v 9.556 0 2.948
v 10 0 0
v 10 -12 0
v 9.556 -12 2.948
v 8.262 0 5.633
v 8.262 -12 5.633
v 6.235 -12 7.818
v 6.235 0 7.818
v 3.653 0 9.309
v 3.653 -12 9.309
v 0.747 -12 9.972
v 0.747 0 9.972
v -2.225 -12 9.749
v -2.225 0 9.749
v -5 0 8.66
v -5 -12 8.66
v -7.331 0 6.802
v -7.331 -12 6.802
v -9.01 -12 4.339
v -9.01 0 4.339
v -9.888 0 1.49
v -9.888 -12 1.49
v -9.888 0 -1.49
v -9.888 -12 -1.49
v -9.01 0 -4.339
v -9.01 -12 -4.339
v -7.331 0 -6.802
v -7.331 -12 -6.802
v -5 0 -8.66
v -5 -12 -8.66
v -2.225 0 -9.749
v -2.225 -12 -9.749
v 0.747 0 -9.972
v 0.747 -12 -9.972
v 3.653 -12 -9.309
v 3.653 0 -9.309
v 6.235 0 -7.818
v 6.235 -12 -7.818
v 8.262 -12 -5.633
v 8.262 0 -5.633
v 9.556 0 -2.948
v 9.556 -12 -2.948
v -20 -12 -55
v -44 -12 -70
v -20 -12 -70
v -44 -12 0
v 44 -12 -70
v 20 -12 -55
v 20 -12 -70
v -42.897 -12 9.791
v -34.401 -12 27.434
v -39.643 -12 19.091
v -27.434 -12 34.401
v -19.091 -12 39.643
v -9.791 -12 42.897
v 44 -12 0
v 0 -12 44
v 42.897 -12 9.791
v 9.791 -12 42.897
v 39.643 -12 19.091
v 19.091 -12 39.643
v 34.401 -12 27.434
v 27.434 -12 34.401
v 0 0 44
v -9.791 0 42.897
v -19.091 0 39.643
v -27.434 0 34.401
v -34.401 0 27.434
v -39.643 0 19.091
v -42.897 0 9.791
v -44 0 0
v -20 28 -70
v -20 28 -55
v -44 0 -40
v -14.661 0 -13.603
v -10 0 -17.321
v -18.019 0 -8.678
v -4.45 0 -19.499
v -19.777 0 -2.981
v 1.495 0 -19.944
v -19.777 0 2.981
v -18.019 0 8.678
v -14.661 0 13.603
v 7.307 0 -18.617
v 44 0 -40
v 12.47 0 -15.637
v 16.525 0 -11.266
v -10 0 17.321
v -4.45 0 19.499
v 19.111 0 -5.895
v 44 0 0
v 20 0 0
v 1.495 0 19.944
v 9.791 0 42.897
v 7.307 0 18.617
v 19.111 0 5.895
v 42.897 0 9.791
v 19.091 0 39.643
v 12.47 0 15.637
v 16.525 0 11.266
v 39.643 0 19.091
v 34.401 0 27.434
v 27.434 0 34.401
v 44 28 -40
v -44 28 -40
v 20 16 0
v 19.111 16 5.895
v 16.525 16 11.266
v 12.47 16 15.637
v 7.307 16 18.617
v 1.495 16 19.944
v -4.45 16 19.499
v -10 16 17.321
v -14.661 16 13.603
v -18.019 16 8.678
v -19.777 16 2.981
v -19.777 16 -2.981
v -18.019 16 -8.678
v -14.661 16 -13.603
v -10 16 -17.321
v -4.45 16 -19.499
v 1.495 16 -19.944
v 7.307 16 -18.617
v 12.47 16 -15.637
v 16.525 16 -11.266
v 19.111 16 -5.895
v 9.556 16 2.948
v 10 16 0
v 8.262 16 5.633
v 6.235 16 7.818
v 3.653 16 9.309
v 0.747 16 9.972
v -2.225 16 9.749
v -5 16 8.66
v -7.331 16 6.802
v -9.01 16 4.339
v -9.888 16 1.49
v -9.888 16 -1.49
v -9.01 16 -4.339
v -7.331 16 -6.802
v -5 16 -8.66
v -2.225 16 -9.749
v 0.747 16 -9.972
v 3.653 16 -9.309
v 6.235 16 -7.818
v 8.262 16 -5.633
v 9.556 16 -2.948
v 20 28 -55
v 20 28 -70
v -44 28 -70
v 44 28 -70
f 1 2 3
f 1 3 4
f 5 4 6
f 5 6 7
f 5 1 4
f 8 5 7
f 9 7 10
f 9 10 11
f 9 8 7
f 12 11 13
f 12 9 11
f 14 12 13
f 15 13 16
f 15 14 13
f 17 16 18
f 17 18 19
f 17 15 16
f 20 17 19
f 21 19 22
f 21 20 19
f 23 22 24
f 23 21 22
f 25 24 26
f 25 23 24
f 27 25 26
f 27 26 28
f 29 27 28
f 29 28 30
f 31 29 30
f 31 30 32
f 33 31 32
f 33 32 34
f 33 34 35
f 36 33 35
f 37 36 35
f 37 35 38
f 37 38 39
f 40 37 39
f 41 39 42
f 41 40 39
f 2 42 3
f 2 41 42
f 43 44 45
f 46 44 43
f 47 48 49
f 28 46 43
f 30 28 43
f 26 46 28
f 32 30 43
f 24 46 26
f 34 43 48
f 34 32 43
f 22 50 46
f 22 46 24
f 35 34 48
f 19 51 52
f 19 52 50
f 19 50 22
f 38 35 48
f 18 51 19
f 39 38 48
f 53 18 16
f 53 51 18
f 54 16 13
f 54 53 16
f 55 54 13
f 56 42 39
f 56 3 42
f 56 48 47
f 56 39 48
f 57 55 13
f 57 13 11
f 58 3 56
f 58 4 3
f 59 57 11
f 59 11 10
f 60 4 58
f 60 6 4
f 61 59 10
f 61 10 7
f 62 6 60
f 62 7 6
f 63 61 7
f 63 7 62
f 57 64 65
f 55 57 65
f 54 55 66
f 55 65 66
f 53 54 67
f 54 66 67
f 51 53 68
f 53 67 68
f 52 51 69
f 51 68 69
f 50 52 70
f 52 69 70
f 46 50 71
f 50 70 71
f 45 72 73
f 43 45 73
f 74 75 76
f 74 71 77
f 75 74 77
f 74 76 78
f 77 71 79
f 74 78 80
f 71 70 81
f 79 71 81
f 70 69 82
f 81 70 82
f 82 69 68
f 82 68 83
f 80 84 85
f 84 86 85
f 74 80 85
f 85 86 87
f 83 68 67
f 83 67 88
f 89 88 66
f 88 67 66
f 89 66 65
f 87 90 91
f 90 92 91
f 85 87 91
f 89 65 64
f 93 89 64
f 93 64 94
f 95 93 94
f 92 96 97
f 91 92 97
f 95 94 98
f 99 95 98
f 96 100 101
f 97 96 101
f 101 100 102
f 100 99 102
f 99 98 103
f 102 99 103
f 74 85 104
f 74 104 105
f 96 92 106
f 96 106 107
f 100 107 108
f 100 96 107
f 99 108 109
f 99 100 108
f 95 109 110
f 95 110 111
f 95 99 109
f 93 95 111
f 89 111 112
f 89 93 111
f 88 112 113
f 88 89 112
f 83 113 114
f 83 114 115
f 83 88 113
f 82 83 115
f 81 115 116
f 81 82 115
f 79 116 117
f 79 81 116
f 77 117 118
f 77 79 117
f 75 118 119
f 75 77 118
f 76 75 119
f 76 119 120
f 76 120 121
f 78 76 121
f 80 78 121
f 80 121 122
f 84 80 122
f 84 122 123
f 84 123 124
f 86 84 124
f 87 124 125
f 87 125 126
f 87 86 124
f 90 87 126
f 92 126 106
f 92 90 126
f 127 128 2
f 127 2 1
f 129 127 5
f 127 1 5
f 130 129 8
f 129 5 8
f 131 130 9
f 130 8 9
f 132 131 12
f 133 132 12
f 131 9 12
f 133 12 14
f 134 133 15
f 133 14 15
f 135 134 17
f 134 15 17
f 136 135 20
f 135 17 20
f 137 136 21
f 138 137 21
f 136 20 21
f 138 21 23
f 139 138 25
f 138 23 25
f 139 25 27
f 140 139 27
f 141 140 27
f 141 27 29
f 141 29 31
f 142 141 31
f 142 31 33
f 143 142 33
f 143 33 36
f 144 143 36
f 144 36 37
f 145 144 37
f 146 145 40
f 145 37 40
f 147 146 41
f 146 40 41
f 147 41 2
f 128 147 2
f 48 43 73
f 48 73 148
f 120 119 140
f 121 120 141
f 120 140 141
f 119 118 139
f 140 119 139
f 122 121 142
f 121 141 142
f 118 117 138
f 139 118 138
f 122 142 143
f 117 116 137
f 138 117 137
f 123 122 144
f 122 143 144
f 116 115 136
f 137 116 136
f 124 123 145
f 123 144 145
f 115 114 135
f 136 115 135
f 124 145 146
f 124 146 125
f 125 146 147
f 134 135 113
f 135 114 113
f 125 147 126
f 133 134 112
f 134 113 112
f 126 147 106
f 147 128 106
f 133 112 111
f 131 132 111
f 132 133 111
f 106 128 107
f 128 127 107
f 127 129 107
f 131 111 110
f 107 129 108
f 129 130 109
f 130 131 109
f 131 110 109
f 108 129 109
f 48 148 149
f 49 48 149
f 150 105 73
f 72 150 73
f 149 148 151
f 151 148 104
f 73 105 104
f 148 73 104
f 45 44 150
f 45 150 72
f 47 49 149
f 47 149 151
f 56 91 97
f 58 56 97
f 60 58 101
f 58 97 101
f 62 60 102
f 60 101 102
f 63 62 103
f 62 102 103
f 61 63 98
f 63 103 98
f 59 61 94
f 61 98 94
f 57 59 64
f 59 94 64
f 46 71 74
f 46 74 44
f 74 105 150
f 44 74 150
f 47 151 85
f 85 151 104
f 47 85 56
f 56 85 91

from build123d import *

# Parameters (mm, degrees)
F1_DEPTH      = 12
F1_DEPTH_BACK = 28
F0_R          = 20
F2_DEPTH      = 12
F0_R_2        = 10
F3_DEPTH      = 12
F3_DEPTH_BACK = 16


with BuildPart() as f1:
    # F0 (on Front) → F1 (new body, two sides)
    with BuildSketch(Plane.XZ) as f1_sk:
        Polygon((44, -40), (-44, -40), (-44, -70), (-20, -70), (-20, -55), (20, -55), (20, -70), (44, -70), align=None)
    extrude(amount=F1_DEPTH)
    extrude(f1_sk.sketch, amount=-F1_DEPTH_BACK)

    # F0 (on Front) → F2 (join)
    with BuildSketch(Plane.XZ):
        with BuildLine():
            Line((-44, 0), (-44, -40))
            Line((-44, -40), (44, -40))
            Line((44, -40), (44, 0))
            ThreePointArc((44, 0), (31.112698, 31.112698), (0, 44))
            ThreePointArc((0, 44), (-31.112698, 31.112698), (-44, 0))
        make_face()
        Circle(F0_R, mode=Mode.SUBTRACT)
        Polygon((44, -40), (-44, -40), (-44, -70), (-20, -70), (-20, -55), (20, -55), (20, -70), (44, -70), align=None)
    extrude(amount=F2_DEPTH)

    # F0 (on Front) → F3 (join, two sides)
    with BuildSketch(Plane.XZ) as f3_sk:
        Circle(F0_R)
        Circle(F0_R_2, mode=Mode.SUBTRACT)
    extrude(amount=F3_DEPTH)
    extrude(f3_sk.sketch, amount=-F3_DEPTH_BACK)


solid = f1.part
